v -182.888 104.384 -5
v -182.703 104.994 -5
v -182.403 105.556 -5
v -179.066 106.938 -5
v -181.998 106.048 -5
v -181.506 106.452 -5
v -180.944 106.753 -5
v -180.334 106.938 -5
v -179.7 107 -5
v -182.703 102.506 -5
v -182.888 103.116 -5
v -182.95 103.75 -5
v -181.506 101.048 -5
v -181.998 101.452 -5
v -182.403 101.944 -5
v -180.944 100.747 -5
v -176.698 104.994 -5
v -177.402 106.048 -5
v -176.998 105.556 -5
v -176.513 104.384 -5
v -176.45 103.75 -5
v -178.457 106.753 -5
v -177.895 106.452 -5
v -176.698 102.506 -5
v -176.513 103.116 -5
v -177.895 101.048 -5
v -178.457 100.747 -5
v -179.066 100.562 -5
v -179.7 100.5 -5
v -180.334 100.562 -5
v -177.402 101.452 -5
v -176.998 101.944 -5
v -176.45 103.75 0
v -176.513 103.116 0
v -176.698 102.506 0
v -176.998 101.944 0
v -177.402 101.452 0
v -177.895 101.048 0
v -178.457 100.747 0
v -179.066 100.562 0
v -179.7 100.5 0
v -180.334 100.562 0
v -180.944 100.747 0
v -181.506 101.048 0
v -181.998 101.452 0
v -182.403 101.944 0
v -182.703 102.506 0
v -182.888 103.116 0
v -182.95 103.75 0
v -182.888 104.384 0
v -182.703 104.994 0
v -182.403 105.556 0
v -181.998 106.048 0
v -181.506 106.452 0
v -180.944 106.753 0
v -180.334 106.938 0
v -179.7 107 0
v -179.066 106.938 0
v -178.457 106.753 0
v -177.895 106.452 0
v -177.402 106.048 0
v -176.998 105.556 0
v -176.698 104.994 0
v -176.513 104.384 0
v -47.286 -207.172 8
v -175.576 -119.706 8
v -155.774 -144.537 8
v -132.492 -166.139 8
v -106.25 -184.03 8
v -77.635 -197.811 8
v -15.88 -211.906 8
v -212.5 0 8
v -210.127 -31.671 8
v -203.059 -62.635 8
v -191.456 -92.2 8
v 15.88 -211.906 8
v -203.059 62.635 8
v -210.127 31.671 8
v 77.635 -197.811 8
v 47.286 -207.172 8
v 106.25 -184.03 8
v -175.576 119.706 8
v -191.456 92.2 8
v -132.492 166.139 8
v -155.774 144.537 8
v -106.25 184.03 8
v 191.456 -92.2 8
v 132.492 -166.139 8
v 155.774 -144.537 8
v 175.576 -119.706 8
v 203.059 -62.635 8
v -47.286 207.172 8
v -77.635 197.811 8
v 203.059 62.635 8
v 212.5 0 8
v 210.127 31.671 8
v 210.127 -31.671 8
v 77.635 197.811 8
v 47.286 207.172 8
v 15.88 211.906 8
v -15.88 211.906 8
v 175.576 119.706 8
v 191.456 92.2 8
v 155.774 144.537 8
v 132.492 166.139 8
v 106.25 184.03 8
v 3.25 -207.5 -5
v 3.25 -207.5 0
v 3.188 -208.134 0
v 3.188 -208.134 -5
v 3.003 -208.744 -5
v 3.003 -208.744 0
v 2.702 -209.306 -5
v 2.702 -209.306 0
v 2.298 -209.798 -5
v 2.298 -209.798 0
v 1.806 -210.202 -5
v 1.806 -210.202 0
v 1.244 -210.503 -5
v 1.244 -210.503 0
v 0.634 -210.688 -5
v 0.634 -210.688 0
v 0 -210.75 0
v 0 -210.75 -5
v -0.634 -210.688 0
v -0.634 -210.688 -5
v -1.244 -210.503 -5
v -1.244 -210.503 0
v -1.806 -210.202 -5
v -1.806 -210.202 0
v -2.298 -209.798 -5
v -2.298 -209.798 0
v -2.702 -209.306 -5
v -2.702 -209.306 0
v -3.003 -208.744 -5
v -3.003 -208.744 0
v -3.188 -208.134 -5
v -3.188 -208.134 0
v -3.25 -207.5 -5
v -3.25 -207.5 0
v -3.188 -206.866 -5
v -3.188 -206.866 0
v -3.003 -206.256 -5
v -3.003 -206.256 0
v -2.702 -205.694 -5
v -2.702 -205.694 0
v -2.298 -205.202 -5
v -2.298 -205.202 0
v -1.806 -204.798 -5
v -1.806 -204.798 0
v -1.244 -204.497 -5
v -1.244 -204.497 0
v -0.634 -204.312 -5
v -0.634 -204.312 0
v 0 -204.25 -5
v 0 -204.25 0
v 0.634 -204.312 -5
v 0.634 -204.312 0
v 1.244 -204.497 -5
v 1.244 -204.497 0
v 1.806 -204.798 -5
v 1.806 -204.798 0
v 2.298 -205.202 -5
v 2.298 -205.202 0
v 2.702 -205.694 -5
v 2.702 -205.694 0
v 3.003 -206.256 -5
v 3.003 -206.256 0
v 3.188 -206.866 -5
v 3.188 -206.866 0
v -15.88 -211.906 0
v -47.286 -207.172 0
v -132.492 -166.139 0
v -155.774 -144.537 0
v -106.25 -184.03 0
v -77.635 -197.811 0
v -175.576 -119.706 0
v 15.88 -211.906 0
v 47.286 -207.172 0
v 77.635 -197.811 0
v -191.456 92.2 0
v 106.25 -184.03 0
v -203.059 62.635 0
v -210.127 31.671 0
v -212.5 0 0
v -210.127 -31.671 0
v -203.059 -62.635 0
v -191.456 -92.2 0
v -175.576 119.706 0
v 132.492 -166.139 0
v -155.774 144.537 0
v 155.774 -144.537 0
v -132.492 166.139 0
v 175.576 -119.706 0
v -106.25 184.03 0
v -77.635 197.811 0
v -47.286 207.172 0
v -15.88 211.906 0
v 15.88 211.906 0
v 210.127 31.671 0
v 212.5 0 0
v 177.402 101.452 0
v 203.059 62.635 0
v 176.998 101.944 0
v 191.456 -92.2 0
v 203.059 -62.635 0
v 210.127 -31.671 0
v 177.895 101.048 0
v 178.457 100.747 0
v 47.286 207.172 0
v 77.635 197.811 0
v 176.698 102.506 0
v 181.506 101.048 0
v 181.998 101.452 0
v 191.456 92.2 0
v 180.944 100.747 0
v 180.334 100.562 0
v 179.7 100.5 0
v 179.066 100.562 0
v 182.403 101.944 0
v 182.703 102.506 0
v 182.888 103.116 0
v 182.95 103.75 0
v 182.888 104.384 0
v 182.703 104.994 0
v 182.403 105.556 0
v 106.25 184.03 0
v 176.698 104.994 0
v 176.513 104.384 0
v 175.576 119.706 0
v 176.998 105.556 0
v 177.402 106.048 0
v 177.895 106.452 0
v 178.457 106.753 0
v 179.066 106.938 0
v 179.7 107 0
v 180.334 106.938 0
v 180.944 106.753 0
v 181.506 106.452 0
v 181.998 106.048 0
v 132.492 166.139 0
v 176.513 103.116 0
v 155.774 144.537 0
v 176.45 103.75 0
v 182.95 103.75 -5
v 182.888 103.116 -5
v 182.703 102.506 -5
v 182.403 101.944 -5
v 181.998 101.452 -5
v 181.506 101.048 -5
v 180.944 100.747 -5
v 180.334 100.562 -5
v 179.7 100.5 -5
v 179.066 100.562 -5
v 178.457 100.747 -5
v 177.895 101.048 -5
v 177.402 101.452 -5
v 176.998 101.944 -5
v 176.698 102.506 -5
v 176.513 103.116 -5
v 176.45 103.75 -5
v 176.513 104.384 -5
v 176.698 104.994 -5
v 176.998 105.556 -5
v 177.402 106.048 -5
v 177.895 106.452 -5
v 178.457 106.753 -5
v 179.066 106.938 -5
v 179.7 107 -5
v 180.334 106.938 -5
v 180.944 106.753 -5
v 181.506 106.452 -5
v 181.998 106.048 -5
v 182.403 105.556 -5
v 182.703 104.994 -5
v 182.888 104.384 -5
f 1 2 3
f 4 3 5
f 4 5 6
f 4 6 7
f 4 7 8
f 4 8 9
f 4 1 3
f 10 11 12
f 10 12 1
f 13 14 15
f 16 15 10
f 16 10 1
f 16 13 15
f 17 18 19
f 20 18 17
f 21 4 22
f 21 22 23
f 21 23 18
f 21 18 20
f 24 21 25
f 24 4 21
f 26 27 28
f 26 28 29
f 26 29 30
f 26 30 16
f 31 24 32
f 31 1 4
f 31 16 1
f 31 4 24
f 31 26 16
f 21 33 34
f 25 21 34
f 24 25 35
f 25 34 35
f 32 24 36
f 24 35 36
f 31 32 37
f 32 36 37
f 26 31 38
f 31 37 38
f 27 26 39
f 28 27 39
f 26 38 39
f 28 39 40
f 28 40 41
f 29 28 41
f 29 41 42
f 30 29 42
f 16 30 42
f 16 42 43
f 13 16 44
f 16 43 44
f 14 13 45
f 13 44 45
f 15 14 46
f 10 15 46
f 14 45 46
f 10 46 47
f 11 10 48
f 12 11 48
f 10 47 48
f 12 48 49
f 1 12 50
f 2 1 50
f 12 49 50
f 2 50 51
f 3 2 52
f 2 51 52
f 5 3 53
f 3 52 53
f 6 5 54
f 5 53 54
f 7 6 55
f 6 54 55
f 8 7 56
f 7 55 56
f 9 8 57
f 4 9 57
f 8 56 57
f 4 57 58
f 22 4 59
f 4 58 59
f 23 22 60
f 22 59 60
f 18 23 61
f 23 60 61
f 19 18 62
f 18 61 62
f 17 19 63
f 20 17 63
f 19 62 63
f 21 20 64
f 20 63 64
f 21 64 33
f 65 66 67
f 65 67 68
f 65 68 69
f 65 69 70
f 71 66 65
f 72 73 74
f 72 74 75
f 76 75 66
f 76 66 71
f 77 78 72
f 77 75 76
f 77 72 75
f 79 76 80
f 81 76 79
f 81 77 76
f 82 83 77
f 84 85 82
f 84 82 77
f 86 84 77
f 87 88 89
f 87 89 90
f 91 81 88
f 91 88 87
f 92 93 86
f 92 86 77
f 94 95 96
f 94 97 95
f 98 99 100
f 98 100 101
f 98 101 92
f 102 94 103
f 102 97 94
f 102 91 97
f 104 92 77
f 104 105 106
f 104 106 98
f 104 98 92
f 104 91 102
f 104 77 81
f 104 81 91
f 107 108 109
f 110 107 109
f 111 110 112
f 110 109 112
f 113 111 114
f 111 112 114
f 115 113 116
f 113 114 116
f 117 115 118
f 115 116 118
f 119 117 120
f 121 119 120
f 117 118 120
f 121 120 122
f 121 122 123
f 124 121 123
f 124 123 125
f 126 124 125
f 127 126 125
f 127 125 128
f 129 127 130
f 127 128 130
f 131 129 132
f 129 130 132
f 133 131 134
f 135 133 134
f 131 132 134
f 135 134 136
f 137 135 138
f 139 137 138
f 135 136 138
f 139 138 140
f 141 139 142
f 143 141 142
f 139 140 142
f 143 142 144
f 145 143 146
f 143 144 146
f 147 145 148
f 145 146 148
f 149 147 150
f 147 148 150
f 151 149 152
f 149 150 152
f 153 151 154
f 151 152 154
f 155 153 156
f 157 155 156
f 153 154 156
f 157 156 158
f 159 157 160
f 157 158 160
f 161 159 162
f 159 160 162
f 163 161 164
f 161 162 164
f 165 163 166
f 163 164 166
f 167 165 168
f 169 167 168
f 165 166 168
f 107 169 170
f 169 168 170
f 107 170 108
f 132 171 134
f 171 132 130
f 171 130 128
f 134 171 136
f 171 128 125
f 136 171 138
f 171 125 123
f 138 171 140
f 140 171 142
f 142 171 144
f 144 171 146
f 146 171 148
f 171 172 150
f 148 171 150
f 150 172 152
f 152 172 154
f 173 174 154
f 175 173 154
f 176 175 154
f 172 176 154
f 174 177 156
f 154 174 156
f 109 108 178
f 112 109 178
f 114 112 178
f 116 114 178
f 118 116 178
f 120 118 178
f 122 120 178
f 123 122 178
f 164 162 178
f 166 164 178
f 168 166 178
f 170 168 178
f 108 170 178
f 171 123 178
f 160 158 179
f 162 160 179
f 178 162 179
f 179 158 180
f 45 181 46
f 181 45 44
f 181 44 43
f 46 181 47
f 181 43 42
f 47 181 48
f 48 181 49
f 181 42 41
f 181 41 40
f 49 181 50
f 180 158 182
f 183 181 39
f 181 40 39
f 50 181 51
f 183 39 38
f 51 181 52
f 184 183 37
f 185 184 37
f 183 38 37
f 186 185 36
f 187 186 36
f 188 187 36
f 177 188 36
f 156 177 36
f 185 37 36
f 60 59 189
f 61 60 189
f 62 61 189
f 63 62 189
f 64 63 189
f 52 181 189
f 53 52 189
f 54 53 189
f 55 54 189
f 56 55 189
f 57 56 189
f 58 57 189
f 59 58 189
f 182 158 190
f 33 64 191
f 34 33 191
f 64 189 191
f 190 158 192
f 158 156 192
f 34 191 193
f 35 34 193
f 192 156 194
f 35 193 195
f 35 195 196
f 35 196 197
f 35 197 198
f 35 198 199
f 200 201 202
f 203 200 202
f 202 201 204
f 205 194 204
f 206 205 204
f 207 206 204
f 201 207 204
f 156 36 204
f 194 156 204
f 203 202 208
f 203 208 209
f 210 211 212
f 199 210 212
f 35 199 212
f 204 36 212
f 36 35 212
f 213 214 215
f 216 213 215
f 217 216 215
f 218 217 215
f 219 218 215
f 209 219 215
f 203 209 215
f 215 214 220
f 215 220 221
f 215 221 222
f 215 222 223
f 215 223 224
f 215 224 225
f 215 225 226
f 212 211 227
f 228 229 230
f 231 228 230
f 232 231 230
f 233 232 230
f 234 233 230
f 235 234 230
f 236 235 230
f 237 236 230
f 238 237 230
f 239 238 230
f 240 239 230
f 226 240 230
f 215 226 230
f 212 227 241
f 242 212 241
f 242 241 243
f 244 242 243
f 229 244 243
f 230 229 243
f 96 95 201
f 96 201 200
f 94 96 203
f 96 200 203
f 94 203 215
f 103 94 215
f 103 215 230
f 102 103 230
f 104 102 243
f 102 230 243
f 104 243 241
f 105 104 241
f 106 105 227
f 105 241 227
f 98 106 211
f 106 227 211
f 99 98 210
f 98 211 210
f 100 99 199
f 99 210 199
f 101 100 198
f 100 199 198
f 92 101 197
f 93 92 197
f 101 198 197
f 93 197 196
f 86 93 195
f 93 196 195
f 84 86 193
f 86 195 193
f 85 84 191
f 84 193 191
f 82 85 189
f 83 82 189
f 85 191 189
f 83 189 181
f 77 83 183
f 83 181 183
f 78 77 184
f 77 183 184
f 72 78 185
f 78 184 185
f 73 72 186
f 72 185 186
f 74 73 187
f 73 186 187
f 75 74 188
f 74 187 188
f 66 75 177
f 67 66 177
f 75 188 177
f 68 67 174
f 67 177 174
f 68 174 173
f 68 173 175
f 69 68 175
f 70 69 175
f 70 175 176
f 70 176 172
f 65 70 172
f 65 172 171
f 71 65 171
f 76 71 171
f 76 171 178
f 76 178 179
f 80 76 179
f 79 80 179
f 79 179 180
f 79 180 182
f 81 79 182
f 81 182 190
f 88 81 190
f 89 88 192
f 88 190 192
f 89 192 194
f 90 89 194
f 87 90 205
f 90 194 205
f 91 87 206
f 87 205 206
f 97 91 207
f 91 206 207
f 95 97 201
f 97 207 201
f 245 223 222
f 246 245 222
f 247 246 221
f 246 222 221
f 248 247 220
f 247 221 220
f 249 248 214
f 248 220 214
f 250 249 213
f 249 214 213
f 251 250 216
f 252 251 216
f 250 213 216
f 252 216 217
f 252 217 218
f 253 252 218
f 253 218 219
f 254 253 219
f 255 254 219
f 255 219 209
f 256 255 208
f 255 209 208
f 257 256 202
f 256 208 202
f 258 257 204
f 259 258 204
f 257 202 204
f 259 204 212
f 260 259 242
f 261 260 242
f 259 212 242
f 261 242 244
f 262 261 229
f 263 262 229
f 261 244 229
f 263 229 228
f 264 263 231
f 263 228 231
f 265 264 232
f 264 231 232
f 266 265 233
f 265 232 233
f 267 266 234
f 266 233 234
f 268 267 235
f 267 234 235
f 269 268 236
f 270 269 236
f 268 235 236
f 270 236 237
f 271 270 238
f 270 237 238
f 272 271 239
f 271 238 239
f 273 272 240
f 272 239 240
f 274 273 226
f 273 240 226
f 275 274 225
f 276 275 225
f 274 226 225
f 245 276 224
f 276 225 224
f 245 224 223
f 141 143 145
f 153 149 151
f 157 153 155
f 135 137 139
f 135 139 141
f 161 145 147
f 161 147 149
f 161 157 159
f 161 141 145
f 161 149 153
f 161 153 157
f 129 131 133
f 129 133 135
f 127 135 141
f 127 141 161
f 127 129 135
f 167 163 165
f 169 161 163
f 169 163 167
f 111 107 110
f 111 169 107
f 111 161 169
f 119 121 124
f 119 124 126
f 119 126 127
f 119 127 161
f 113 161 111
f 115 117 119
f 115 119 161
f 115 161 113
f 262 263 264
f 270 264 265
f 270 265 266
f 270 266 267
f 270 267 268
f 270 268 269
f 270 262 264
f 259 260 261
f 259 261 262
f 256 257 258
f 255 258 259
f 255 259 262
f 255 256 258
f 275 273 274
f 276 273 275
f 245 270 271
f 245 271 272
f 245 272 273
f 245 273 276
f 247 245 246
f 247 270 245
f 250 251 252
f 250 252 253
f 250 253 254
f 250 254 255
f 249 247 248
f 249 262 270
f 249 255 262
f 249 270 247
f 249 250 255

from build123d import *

# Parameters (mm, degrees)
F0_R     = 212.5
F1_DEPTH = 8
F2_R     = 3.25
F3_DEPTH = 5


with BuildPart() as f1:
    # F0 (on Top) → F1 (new body)
    with BuildSketch(Plane.XY):
        Circle(F0_R)
    extrude(amount=F1_DEPTH)

    # F2 (on face) → F3 (join)
    with BuildSketch(Plane(origin=(0, 0, 0), x_dir=(1, 0, 0), z_dir=(0, 0, -1))):
        with Locations((0, 207.5)):
            Circle(F2_R)
        with Locations((-179.700271, -103.75)):
            Circle(F2_R)
        with Locations((179.700271, -103.75)):
            Circle(F2_R)
    extrude(amount=F3_DEPTH)


solid = f1.part
